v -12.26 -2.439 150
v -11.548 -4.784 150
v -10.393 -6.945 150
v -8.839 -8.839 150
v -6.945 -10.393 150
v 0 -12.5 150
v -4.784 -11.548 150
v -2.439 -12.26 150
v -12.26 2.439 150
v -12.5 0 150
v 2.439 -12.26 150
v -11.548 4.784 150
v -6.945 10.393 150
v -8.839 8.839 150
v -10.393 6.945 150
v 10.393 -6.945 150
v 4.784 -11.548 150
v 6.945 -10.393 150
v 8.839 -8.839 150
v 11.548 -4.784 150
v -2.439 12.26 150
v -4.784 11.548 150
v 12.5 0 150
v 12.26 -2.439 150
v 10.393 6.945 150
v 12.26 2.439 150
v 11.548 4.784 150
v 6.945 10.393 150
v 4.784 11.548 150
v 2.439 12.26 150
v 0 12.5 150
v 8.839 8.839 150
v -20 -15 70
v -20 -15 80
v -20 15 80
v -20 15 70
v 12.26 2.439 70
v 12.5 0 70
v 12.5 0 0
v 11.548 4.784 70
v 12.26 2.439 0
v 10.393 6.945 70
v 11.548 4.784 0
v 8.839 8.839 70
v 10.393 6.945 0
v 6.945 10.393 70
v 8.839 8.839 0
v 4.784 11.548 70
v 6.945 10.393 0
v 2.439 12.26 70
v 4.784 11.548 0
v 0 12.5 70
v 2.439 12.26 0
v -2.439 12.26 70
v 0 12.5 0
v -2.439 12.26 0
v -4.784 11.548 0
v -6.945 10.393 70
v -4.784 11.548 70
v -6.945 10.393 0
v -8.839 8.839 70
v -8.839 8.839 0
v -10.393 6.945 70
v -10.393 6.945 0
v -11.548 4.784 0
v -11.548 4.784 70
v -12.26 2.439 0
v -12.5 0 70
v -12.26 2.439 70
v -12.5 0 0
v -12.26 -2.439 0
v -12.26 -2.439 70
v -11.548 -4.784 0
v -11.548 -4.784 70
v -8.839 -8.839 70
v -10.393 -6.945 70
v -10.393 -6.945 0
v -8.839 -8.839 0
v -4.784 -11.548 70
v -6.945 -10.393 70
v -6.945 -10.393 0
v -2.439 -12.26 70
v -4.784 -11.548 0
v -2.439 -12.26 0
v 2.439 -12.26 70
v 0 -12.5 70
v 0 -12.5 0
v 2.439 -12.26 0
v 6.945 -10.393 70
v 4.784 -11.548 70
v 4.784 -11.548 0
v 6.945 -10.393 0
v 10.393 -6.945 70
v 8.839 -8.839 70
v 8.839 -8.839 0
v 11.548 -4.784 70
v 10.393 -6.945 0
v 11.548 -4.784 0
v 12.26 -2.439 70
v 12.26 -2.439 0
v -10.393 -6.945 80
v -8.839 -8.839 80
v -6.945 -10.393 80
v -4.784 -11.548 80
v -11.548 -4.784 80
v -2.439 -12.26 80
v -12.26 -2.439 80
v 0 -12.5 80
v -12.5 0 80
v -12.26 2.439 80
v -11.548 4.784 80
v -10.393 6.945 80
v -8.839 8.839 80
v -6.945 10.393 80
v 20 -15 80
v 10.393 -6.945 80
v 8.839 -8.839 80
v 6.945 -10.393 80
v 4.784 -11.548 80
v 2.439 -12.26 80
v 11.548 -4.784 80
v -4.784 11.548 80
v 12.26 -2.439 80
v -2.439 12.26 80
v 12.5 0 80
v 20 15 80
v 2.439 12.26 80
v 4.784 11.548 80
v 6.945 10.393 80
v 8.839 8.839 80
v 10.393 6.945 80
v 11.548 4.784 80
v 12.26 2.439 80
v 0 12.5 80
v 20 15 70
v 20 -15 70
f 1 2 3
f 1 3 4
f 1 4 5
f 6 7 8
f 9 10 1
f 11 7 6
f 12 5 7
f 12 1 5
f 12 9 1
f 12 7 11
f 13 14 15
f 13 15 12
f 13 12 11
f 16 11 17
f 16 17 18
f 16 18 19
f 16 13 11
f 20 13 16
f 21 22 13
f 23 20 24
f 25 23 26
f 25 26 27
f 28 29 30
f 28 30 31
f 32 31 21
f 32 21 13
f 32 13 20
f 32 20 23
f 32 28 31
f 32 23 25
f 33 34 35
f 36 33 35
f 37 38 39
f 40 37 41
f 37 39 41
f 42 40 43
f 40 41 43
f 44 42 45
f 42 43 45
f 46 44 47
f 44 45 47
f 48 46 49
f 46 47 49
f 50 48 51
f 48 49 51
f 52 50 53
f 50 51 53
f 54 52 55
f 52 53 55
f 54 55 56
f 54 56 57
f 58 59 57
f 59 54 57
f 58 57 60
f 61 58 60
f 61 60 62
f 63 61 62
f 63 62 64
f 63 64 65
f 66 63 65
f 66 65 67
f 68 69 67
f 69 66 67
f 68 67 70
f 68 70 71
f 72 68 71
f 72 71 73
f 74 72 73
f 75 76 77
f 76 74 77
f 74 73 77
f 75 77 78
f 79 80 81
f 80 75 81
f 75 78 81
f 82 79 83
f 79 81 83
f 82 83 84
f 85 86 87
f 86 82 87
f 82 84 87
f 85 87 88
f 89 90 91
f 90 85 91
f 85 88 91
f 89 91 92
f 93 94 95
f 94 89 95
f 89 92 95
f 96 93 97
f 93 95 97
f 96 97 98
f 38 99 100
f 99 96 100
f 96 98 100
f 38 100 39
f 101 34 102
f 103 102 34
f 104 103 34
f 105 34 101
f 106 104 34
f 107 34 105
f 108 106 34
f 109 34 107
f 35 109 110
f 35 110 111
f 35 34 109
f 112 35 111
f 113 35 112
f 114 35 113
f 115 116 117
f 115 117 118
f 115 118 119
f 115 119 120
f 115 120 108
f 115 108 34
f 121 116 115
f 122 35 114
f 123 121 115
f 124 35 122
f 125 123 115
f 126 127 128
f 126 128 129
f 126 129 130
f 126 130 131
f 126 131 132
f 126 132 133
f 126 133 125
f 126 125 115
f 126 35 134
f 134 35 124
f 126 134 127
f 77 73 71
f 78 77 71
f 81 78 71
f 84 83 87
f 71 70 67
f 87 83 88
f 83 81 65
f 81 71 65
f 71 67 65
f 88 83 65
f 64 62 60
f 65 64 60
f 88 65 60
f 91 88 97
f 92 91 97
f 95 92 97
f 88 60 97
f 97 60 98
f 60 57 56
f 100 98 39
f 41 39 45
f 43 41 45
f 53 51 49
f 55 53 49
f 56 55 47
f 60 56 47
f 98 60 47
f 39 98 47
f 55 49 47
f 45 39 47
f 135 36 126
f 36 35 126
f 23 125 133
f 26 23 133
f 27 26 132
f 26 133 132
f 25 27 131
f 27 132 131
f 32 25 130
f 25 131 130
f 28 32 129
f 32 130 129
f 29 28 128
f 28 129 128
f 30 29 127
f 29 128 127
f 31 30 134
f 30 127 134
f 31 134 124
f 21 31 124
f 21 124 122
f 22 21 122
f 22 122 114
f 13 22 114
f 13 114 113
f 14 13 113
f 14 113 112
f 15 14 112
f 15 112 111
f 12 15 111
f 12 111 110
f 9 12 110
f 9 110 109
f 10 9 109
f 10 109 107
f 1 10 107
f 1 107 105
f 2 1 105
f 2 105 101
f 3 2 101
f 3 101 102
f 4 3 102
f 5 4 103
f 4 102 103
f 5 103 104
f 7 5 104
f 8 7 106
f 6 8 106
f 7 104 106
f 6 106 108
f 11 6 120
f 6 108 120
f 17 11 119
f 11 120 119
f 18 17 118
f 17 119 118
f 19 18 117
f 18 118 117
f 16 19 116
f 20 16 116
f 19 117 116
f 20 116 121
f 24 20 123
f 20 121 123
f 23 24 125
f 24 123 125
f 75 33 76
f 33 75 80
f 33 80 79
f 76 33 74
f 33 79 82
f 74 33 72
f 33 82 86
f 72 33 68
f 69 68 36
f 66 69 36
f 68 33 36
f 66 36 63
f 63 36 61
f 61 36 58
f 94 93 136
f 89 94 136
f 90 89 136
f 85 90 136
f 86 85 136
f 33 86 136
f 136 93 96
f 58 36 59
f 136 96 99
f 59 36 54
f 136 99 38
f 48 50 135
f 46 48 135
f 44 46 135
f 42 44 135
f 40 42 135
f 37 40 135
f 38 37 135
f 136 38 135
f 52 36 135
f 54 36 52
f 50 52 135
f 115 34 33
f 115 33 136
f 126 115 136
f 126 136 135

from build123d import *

# Parameters (mm, degrees)
SKETCH1_R                = 12.5
BOSS_EXTRUDE1_DEPTH      = 150
BOSS_EXTRUDE2_START      = 75
SKETCH2_W                = 40
SKETCH2_H                = 30
BOSS_EXTRUDE2_DEPTH      = 5
BOSS_EXTRUDE2_DEPTH_BACK = 5


with BuildPart() as part:
    # Sketch1 → Boss-Extrude1 (new body)
    with BuildSketch(Plane.XY):
        Circle(SKETCH1_R)
    extrude(amount=BOSS_EXTRUDE1_DEPTH)

    # Sketch2 → Boss-Extrude2 (add, two sides)
    with BuildSketch(Plane.XY.offset(BOSS_EXTRUDE2_START)) as boss_extrude2_sk:
        Rectangle(SKETCH2_W, SKETCH2_H)
    extrude(amount=BOSS_EXTRUDE2_DEPTH)
    extrude(boss_extrude2_sk.sketch, amount=-BOSS_EXTRUDE2_DEPTH_BACK)


solid = part.part
